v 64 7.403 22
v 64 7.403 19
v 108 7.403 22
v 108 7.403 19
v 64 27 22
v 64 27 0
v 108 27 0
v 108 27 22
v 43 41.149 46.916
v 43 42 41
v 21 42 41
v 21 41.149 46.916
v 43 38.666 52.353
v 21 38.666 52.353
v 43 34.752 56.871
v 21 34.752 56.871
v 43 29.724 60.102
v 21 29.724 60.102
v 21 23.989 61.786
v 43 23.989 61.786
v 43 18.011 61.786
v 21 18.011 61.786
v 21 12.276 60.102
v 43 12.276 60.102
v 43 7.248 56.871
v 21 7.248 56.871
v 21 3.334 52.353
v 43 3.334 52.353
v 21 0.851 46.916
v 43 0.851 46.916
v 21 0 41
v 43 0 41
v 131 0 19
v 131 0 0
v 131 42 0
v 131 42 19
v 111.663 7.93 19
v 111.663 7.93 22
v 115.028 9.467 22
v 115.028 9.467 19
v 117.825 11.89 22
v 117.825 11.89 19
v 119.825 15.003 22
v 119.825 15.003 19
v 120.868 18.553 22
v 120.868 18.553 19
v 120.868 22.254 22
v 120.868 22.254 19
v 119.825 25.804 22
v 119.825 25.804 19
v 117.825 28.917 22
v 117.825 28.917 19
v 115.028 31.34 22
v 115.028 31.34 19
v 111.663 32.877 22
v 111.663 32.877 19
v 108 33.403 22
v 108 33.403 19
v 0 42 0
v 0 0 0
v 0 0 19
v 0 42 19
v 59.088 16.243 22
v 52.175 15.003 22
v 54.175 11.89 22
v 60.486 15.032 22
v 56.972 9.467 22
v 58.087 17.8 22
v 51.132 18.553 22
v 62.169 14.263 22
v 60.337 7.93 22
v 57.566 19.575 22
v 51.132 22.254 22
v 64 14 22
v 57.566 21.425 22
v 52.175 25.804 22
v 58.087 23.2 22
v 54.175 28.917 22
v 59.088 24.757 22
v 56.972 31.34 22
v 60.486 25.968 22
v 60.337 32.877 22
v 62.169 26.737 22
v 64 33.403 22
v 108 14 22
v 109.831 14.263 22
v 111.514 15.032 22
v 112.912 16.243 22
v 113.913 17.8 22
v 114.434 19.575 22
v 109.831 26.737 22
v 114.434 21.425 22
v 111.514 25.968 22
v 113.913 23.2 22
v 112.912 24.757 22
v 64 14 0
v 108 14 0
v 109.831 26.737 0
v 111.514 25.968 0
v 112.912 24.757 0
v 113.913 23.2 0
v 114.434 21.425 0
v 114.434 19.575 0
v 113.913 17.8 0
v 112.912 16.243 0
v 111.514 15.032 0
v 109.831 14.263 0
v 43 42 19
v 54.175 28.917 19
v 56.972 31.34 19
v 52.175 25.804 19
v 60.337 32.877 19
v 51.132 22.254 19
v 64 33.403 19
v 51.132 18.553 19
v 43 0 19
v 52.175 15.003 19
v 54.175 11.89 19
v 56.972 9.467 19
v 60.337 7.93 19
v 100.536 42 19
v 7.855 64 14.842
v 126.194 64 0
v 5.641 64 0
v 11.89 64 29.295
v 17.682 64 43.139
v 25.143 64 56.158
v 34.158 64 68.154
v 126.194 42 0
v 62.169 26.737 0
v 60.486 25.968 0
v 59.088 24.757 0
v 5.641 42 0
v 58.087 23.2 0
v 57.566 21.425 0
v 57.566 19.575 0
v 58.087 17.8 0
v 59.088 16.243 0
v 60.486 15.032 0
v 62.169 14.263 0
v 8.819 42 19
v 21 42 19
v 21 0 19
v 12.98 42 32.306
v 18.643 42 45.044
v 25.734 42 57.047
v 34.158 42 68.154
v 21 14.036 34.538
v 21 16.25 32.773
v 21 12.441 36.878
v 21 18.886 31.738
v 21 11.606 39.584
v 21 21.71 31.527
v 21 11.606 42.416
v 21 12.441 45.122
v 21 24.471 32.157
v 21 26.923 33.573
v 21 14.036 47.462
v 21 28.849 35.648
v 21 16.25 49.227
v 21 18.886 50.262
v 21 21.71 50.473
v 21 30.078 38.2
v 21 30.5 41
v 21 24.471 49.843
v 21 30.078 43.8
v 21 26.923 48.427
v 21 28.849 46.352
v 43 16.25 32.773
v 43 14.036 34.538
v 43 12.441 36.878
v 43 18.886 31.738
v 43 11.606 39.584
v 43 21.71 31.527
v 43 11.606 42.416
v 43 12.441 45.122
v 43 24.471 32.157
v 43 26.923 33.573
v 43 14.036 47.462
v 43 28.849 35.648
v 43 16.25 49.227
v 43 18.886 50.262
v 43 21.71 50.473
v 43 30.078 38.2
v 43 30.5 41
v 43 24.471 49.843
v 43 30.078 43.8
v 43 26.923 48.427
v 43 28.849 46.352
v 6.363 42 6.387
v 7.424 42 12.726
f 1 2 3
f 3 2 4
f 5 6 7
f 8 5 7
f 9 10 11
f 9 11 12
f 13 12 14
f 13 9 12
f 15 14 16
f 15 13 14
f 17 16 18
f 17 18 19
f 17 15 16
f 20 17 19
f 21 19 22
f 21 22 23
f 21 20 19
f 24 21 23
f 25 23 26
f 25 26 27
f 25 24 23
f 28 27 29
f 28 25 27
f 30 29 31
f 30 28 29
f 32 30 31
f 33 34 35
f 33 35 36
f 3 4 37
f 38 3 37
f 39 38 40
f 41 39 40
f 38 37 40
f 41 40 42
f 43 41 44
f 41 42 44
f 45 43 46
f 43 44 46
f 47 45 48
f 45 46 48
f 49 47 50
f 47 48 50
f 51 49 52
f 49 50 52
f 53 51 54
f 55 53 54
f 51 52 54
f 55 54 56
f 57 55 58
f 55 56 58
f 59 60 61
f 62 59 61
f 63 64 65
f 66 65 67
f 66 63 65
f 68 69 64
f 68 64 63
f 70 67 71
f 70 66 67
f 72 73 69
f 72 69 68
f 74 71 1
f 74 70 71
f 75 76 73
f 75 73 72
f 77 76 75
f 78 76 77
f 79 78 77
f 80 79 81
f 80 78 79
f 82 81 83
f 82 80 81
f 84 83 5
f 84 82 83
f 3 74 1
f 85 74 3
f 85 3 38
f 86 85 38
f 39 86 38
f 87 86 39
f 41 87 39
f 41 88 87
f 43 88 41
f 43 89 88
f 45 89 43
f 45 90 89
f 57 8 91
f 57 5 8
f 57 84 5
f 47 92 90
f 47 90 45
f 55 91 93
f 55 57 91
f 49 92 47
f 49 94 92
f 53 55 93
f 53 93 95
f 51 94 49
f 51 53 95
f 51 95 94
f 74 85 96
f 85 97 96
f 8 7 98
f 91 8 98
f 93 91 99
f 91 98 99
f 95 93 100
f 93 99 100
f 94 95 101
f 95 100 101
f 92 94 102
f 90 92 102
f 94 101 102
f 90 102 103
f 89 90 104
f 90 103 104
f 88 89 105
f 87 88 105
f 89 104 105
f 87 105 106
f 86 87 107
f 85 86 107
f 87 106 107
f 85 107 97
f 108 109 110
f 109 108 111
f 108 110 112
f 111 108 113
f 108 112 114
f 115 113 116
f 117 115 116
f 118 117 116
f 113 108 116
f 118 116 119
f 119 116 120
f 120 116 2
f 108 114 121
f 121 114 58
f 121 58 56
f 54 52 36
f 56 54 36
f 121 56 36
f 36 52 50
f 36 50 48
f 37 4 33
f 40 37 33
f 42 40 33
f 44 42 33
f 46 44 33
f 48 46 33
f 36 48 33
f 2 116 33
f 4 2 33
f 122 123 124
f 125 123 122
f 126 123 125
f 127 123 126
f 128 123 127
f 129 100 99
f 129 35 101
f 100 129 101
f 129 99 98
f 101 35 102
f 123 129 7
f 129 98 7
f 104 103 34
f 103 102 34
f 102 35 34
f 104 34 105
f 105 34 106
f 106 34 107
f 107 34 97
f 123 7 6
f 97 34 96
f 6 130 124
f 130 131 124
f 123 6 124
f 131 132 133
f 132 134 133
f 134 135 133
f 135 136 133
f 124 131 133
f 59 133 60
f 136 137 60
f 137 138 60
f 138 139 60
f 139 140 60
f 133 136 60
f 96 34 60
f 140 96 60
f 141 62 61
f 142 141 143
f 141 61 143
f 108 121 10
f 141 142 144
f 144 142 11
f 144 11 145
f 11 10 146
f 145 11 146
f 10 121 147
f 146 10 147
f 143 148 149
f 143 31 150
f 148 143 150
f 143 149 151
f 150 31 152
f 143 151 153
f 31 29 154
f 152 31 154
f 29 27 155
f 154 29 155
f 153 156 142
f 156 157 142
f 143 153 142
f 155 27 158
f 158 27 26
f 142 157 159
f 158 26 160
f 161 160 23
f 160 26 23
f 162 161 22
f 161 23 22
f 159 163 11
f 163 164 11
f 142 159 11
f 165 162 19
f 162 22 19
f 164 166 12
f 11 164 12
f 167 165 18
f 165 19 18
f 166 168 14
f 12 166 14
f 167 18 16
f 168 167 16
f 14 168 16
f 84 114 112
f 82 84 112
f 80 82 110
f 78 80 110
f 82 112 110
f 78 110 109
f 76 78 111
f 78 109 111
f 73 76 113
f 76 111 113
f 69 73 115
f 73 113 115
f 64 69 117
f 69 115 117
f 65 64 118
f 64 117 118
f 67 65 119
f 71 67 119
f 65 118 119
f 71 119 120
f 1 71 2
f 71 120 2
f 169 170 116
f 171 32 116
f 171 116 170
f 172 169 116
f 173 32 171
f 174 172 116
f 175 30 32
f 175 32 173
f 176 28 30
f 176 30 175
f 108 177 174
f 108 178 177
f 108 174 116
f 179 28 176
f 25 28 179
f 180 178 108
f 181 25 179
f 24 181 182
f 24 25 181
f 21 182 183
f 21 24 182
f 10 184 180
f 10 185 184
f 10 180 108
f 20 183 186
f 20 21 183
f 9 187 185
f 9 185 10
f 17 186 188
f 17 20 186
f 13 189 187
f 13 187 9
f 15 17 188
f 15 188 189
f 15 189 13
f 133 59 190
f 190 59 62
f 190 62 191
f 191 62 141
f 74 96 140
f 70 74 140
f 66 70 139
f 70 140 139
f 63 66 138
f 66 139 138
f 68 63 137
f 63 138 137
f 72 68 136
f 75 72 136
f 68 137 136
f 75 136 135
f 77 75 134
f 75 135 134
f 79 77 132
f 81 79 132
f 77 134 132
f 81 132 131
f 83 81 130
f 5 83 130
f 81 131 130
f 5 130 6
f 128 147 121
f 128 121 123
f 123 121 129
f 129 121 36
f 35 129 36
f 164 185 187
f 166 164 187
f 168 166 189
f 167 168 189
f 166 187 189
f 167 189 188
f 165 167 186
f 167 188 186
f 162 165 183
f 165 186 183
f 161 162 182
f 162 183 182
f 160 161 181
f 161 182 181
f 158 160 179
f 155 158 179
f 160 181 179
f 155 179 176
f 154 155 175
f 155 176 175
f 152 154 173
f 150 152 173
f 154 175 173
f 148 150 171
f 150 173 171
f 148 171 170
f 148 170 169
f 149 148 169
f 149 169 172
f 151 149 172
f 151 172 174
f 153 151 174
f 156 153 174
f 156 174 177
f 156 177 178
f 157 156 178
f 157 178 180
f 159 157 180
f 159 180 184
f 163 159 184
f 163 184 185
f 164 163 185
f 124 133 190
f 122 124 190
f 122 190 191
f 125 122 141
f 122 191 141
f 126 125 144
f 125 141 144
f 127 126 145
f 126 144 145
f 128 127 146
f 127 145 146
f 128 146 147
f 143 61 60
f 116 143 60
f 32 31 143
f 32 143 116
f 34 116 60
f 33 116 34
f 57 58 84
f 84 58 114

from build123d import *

# Parameters (mm, degrees)
F0_W      = 131
F0_H      = 19
F1_DEPTH  = 42
F2_W      = 22
F2_H      = 22
F3_DEPTH  = 42
F5_DEPTH  = 22
F6_R      = 9.5
F7_DEPTH  = 43.001
F9_DEPTH  = 19.001
F12_DEPTH = 22
F13_DEPTH = 3


with BuildPart() as f1:
    # F0 (on Front) → F1 (new body)
    with BuildSketch(Plane.XZ):
        with Locations((65.5, 9.5)):
            Rectangle(F0_W, F0_H)
    extrude(amount=-F1_DEPTH)

    # F2 (on face) → F3 (join)
    with BuildSketch(Plane.XZ):
        with Locations((32, 30)):
            Rectangle(F2_W, F2_H)
    extrude(amount=-F3_DEPTH)

    # F4 (on face) → F5 (join)
    with BuildSketch(Plane.YZ.offset(43)):
        with BuildLine():
            Line((0, 41), (42, 41))
            ThreePointArc((42, 41), (21, 62), (0, 41))
        make_face()
    extrude(amount=-F5_DEPTH)

    # F6 (on face) → F7 (cut, through all)
    with BuildSketch(Plane.YZ.offset(43)):
        with Locations((21, 41)):
            Circle(F6_R)
    extrude(amount=-F7_DEPTH, mode=Mode.SUBTRACT)

    # F8 (on face) → F9 (cut, through all)
    with BuildSketch(Plane.XY.offset(19)):
        with BuildLine():
            ThreePointArc((64, 27), (57.5, 20.5), (64, 14))
            Line((64, 14), (108, 14))
            ThreePointArc((108, 14), (114.5, 20.5), (108, 27))
            Line((108, 27), (64, 27))
        make_face()
    extrude(amount=-F9_DEPTH, mode=Mode.SUBTRACT)

    # F11 (on face) → F12 (join)
    with BuildSketch(Plane(origin=(0, 42, 0), x_dir=(-1, 0, 0), z_dir=(0, 1, 0))):
        with BuildLine():
            Line((-34.1583360178, 68.1544452659), (-126.1935941596, 0))
            Line((-126.1935941596, 0), (-5.6412019979, 0))
            ThreePointArc((-5.6412019979, 0), (-14.5708616504, 36.3069402207), (-34.1583360178, 68.1544452659))
        make_face()
    extrude(amount=F12_DEPTH)

    # F10 (on face) → F13 (join)
    with BuildSketch(Plane.XY.offset(19)):
        with BuildLine():
            Line((108, 33.4034413099), (64, 33.4034413099))
            ThreePointArc((64, 33.4034413099), (51, 20.4034413099), (64, 7.4034413099))
            Line((64, 7.4034413099), (108, 7.4034413099))
            ThreePointArc((108, 7.4034413099), (121, 20.4034413099), (108, 33.4034413099))
        make_face()
        with BuildLine():
            Line((108, 14), (64, 14))
            ThreePointArc((64, 14), (57.5, 20.5), (64, 27))
            Line((64, 27), (108, 27))
            ThreePointArc((108, 27), (114.5, 20.5), (108, 14))
        make_face(mode=Mode.SUBTRACT)
    extrude(amount=F13_DEPTH)


solid = f1.part
